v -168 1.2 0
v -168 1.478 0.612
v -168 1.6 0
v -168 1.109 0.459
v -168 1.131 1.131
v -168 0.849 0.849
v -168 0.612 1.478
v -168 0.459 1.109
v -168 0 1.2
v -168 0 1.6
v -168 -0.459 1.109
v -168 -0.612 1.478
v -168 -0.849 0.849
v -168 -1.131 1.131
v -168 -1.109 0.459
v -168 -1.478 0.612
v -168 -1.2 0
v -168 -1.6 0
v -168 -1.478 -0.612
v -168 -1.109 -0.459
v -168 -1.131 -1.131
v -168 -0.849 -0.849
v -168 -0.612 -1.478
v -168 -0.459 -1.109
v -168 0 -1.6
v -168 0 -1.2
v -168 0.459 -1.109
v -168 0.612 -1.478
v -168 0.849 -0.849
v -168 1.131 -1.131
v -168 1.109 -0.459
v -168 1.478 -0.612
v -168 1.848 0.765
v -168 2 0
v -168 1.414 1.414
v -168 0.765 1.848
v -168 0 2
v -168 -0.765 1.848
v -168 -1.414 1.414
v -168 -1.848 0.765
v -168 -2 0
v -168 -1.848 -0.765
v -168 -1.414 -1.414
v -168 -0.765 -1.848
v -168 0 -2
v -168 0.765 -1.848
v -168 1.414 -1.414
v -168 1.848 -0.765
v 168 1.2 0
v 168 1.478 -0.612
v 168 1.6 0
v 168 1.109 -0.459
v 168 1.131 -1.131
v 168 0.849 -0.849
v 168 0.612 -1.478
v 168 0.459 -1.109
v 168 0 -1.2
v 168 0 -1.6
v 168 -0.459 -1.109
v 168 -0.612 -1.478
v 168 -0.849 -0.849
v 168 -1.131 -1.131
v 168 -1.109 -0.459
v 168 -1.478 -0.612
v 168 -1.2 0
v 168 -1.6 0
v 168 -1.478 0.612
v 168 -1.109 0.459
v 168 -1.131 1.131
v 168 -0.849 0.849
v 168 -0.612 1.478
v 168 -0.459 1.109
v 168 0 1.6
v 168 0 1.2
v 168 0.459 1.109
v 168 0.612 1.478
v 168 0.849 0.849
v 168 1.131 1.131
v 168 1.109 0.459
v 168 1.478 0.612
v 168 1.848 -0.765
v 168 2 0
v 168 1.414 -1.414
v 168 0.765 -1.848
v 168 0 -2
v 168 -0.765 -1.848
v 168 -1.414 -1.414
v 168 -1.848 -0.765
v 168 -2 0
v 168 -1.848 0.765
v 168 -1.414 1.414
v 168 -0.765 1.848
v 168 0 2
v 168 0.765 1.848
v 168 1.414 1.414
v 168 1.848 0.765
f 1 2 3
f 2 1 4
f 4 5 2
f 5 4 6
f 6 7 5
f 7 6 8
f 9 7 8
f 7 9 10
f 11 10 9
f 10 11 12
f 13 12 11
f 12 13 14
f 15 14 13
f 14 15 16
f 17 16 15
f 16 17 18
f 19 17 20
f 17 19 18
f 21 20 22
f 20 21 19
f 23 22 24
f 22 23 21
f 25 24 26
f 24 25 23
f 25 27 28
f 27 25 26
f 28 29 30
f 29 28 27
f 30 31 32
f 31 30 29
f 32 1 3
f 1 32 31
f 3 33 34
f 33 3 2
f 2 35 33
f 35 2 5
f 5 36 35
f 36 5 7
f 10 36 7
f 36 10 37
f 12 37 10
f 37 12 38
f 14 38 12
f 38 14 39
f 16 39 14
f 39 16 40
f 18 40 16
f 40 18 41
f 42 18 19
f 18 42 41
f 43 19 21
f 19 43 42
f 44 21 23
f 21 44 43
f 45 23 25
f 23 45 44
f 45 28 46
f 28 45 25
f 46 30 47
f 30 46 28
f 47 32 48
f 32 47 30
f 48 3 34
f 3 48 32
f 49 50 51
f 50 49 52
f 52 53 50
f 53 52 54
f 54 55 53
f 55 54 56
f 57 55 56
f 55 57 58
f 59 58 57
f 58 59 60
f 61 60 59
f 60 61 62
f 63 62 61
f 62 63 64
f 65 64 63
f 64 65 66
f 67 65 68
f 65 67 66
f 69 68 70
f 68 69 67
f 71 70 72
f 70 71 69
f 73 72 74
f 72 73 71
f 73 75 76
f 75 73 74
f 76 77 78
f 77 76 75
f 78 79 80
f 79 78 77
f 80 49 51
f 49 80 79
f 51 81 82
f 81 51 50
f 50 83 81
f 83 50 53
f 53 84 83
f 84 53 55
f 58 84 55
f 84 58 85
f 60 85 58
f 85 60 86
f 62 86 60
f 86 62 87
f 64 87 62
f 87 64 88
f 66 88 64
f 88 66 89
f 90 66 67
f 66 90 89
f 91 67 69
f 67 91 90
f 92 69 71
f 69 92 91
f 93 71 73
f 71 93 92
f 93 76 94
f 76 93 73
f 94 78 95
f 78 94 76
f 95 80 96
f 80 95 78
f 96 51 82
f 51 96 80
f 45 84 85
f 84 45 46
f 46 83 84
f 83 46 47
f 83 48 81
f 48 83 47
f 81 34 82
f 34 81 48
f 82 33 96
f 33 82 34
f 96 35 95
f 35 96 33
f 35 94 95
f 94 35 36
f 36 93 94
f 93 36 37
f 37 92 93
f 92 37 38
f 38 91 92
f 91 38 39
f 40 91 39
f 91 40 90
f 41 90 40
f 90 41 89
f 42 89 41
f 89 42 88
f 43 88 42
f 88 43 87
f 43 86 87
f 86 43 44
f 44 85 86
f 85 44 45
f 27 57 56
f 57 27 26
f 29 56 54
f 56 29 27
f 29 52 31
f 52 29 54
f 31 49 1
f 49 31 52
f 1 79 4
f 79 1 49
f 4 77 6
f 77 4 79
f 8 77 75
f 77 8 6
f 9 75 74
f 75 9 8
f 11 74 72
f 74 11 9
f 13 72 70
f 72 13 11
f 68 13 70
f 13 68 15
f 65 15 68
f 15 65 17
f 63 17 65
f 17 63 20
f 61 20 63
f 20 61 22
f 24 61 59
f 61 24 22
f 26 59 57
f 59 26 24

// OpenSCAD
// file: ../p/4-4cyli.scad
use <../lib.scad>
function ldraw_lib__4_4cyli() = [
// 0 Cylinder 1.0
// 0 Name: 4-4cyli.dat
// 0 Author: James Jessiman
// 0 !LDRAW_ORG Primitive UPDATE 2005-01
// 0 !LICENSE Licensed under CC BY 2.0 and CC BY 4.0 : see CAreadme.txt
// 
// 0 BFC CERTIFY CCW
  [0,"BFC","CERTIFY"],
  [0,"BFC","CCW"],
// 
// 0 !HISTORY 1998-12-15 [PTadmin] Official Update 1998-10
// 0 !HISTORY 2002-03-23 [sbliss] Added BFC statement; merged headers from files in distributions LDraw 0.27 and Complete.
// 0 !HISTORY 2002-04-25 [PTadmin] Official Update 2002-02
// 0 !HISTORY 2004-12-14 [guyvivan] BFC CCW
// 0 !HISTORY 2005-12-28 [PTadmin] Official Update 2005-01
// 0 !HISTORY 2007-06-24 [PTadmin] Header formatted for Contributor Agreement
// 0 !HISTORY 2008-07-01 [PTadmin] Official Update 2008-01
// 
// 
// 4 16 1 1 0 0.9239 1 0.3827 0.9239 0 0.3827 1 0 0
  [4,16,1,1,0,0.9239,1,0.3827,0.9239,0,0.3827,1,0,0],
// 5 24 1 0 0 1 1 0 0.9239 0 0.3827 0.9239 0 -0.3827
  [5,24,1,0,0,1,1,0,0.9239,0,0.3827,0.9239,0,-0.3827],
// 4 16 0.9239 1 0.3827 0.7071 1 0.7071 0.7071 0 0.7071 0.9239 0 0.3827
  [4,16,0.9239,1,0.3827,0.7071,1,0.7071,0.7071,0,0.7071,0.9239,0,0.3827],
// 5 24 0.9239 0 0.3827 0.9239 1 0.3827 0.7071 0 0.7071 1 0 0
  [5,24,0.9239,0,0.3827,0.9239,1,0.3827,0.7071,0,0.7071,1,0,0],
// 4 16 0.7071 1 0.7071 0.3827 1 0.9239 0.3827 0 0.9239 0.7071 0 0.7071
  [4,16,0.7071,1,0.7071,0.3827,1,0.9239,0.3827,0,0.9239,0.7071,0,0.7071],
// 5 24 0.7071 0 0.7071 0.7071 1 0.7071 0.3827 0 0.9239 0.9239 0 0.3827
  [5,24,0.7071,0,0.7071,0.7071,1,0.7071,0.3827,0,0.9239,0.9239,0,0.3827],
// 4 16 0.3827 1 0.9239 0 1 1 0 0 1 0.3827 0 0.9239
  [4,16,0.3827,1,0.9239,0,1,1,0,0,1,0.3827,0,0.9239],
// 5 24 0.3827 0 0.9239 0.3827 1 0.9239 0 0 1 0.7071 0 0.7071
  [5,24,0.3827,0,0.9239,0.3827,1,0.9239,0,0,1,0.7071,0,0.7071],
// 4 16 0 1 1 -0.3827 1 0.9239 -0.3827 0 0.9239 0 0 1
  [4,16,0,1,1,-0.3827,1,0.9239,-0.3827,0,0.9239,0,0,1],
// 5 24 0 0 1 0 1 1 -0.3827 0 0.9239 0.3827 0 0.9239
  [5,24,0,0,1,0,1,1,-0.3827,0,0.9239,0.3827,0,0.9239],
// 4 16 -0.3827 1 0.9239 -0.7071 1 0.7071 -0.7071 0 0.7071 -0.3827 0 0.9239
  [4,16,-0.3827,1,0.9239,-0.7071,1,0.7071,-0.7071,0,0.7071,-0.3827,0,0.9239],
// 5 24 -0.3827 0 0.9239 -0.3827 1 0.9239 -0.7071 0 0.7071 0 0 1
  [5,24,-0.3827,0,0.9239,-0.3827,1,0.9239,-0.7071,0,0.7071,0,0,1],
// 4 16 -0.7071 1 0.7071 -0.9239 1 0.3827 -0.9239 0 0.3827 -0.7071 0 0.7071
  [4,16,-0.7071,1,0.7071,-0.9239,1,0.3827,-0.9239,0,0.3827,-0.7071,0,0.7071],
// 5 24 -0.7071 0 0.7071 -0.7071 1 0.7071 -0.9239 0 0.3827 -0.3827 0 0.9239
  [5,24,-0.7071,0,0.7071,-0.7071,1,0.7071,-0.9239,0,0.3827,-0.3827,0,0.9239],
// 4 16 -0.9239 1 0.3827 -1 1 0 -1 0 0 -0.9239 0 0.3827
  [4,16,-0.9239,1,0.3827,-1,1,0,-1,0,0,-0.9239,0,0.3827],
// 5 24 -0.9239 0 0.3827 -0.9239 1 0.3827 -1 0 0 -0.7071 0 0.7071
  [5,24,-0.9239,0,0.3827,-0.9239,1,0.3827,-1,0,0,-0.7071,0,0.7071],
// 4 16 -1 1 0 -0.9239 1 -0.3827 -0.9239 0 -0.3827 -1 0 0
  [4,16,-1,1,0,-0.9239,1,-0.3827,-0.9239,0,-0.3827,-1,0,0],
// 5 24 -1 0 0 -1 1 0 -0.9239 0 -0.3827 -0.9239 0 0.3827
  [5,24,-1,0,0,-1,1,0,-0.9239,0,-0.3827,-0.9239,0,0.3827],
// 4 16 -0.9239 1 -0.3827 -0.7071 1 -0.7071 -0.7071 0 -0.7071 -0.9239 0 -0.3827
  [4,16,-0.9239,1,-0.3827,-0.7071,1,-0.7071,-0.7071,0,-0.7071,-0.9239,0,-0.3827],
// 5 24 -0.9239 0 -0.3827 -0.9239 1 -0.3827 -0.7071 0 -0.7071 -1 0 0
  [5,24,-0.9239,0,-0.3827,-0.9239,1,-0.3827,-0.7071,0,-0.7071,-1,0,0],
// 4 16 -0.7071 1 -0.7071 -0.3827 1 -0.9239 -0.3827 0 -0.9239 -0.7071 0 -0.7071
  [4,16,-0.7071,1,-0.7071,-0.3827,1,-0.9239,-0.3827,0,-0.9239,-0.7071,0,-0.7071],
// 5 24 -0.7071 0 -0.7071 -0.7071 1 -0.7071 -0.3827 0 -0.9239 -0.9239 0 -0.3827
  [5,24,-0.7071,0,-0.7071,-0.7071,1,-0.7071,-0.3827,0,-0.9239,-0.9239,0,-0.3827],
// 4 16 -0.3827 1 -0.9239 0 1 -1 0 0 -1 -0.3827 0 -0.9239
  [4,16,-0.3827,1,-0.9239,0,1,-1,0,0,-1,-0.3827,0,-0.9239],
// 5 24 -0.3827 0 -0.9239 -0.3827 1 -0.9239 0 0 -1 -0.7071 0 -0.7071
  [5,24,-0.3827,0,-0.9239,-0.3827,1,-0.9239,0,0,-1,-0.7071,0,-0.7071],
// 4 16 0 1 -1 0.3827 1 -0.9239 0.3827 0 -0.9239 0 0 -1
  [4,16,0,1,-1,0.3827,1,-0.9239,0.3827,0,-0.9239,0,0,-1],
// 5 24 0 0 -1 0 1 -1 0.3827 0 -0.9239 -0.3827 0 -0.9239
  [5,24,0,0,-1,0,1,-1,0.3827,0,-0.9239,-0.3827,0,-0.9239],
// 4 16 0.3827 1 -0.9239 0.7071 1 -0.7071 0.7071 0 -0.7071 0.3827 0 -0.9239
  [4,16,0.3827,1,-0.9239,0.7071,1,-0.7071,0.7071,0,-0.7071,0.3827,0,-0.9239],
// 5 24 0.3827 0 -0.9239 0.3827 1 -0.9239 0.7071 0 -0.7071 0 0 -1
  [5,24,0.3827,0,-0.9239,0.3827,1,-0.9239,0.7071,0,-0.7071,0,0,-1],
// 4 16 0.7071 1 -0.7071 0.9239 1 -0.3827 0.9239 0 -0.3827 0.7071 0 -0.7071
  [4,16,0.7071,1,-0.7071,0.9239,1,-0.3827,0.9239,0,-0.3827,0.7071,0,-0.7071],
// 5 24 0.7071 0 -0.7071 0.7071 1 -0.7071 0.9239 0 -0.3827 0.3827 0 -0.9239
  [5,24,0.7071,0,-0.7071,0.7071,1,-0.7071,0.9239,0,-0.3827,0.3827,0,-0.9239],
// 4 16 0.9239 1 -0.3827 1 1 0 1 0 0 0.9239 0 -0.3827
  [4,16,0.9239,1,-0.3827,1,1,0,1,0,0,0.9239,0,-0.3827],
// 5 24 0.9239 0 -0.3827 0.9239 1 -0.3827 1 0 0 0.7071 0 -0.7071
  [5,24,0.9239,0,-0.3827,0.9239,1,-0.3827,1,0,0,0.7071,0,-0.7071],
// 0
];
module ldraw_lib__4_4cyli(step=0, col=false, unit=2/5, alt=false, line=0.2, solid=!$preview)
    makepoly(ldraw_lib__4_4cyli(), step=step, col=col, unit=unit, alt=alt, line=line, solid=solid);
ldraw_lib__4_4cyli(line=0.2);
// file: ../p/4-4ring4.scad
use <../lib.scad>
function ldraw_lib__4_4ring4() = [
// 0 Ring  4 x 1.0
// 0 Name: 4-4ring4.dat
// 0 Author: James Jessiman
// 0 !LDRAW_ORG Primitive UPDATE 2009-01
// 0 !LICENSE Licensed under CC BY 2.0 and CC BY 4.0 : see CAreadme.txt
// 
// 0 BFC CERTIFY CCW
  [0,"BFC","CERTIFY"],
  [0,"BFC","CCW"],
// 
// 0 !HISTORY 1998-12-15 [PTadmin] Official Update 1998-10
// 0 !HISTORY 2002-04-08 [BrickCaster] Modified for BFC compliance
// 0 !HISTORY 2002-04-25 [PTadmin] Official Update 2002-02
// 0 !HISTORY 2007-06-24 [PTadmin] Header formatted for Contributor Agreement
// 0 !HISTORY 2008-07-01 [PTadmin] Official Update 2008-01
// 0 !HISTORY 2008-08-26 [cwdee] Switch polygon winding and rename
// 0 !HISTORY 2009-05-02 [PTadmin] Official Update 2009-01
// 
// 
// 4 16 -1.9135 0 4.6195 -1.5308 0 3.6956 0 0 4 0 0 5
  [4,16,-1.9135,0,4.6195,-1.5308,0,3.6956,0,0,4,0,0,5],
// 4 16 -3.5355 0 3.5355 -2.8284 0 2.8284 -1.5308 0 3.6956 -1.9135 0 4.6195
  [4,16,-3.5355,0,3.5355,-2.8284,0,2.8284,-1.5308,0,3.6956,-1.9135,0,4.6195],
// 4 16 -4.6195 0 1.9135 -3.6956 0 1.5308 -2.8284 0 2.8284 -3.5355 0 3.5355
  [4,16,-4.6195,0,1.9135,-3.6956,0,1.5308,-2.8284,0,2.8284,-3.5355,0,3.5355],
// 4 16 -5 0 0 -4 0 0 -3.6956 0 1.5308 -4.6195 0 1.9135
  [4,16,-5,0,0,-4,0,0,-3.6956,0,1.5308,-4.6195,0,1.9135],
// 4 16 -4.6195 0 -1.9135 -3.6956 0 -1.5308 -4 0 0 -5 0 0
  [4,16,-4.6195,0,-1.9135,-3.6956,0,-1.5308,-4,0,0,-5,0,0],
// 4 16 -3.5355 0 -3.5355 -2.8284 0 -2.8284 -3.6956 0 -1.5308 -4.6195 0 -1.9135
  [4,16,-3.5355,0,-3.5355,-2.8284,0,-2.8284,-3.6956,0,-1.5308,-4.6195,0,-1.9135],
// 4 16 -1.9135 0 -4.6195 -1.5308 0 -3.6956 -2.8284 0 -2.8284 -3.5355 0 -3.5355
  [4,16,-1.9135,0,-4.6195,-1.5308,0,-3.6956,-2.8284,0,-2.8284,-3.5355,0,-3.5355],
// 4 16 0 0 -5 0 0 -4 -1.5308 0 -3.6956 -1.9135 0 -4.6195
  [4,16,0,0,-5,0,0,-4,-1.5308,0,-3.6956,-1.9135,0,-4.6195],
// 4 16 1.9135 0 -4.6195 1.5308 0 -3.6956 0 0 -4 0 0 -5
  [4,16,1.9135,0,-4.6195,1.5308,0,-3.6956,0,0,-4,0,0,-5],
// 4 16 3.5355 0 -3.5355 2.8284 0 -2.8284 1.5308 0 -3.6956 1.9135 0 -4.6195
  [4,16,3.5355,0,-3.5355,2.8284,0,-2.8284,1.5308,0,-3.6956,1.9135,0,-4.6195],
// 4 16 4.6195 0 -1.9135 3.6956 0 -1.5308 2.8284 0 -2.8284 3.5355 0 -3.5355
  [4,16,4.6195,0,-1.9135,3.6956,0,-1.5308,2.8284,0,-2.8284,3.5355,0,-3.5355],
// 4 16 5 0 0 4 0 0 3.6956 0 -1.5308 4.6195 0 -1.9135
  [4,16,5,0,0,4,0,0,3.6956,0,-1.5308,4.6195,0,-1.9135],
// 4 16 4.6195 0 1.9135 3.6956 0 1.5308 4 0 0 5 0 0
  [4,16,4.6195,0,1.9135,3.6956,0,1.5308,4,0,0,5,0,0],
// 4 16 3.5355 0 3.5355 2.8284 0 2.8284 3.6956 0 1.5308 4.6195 0 1.9135
  [4,16,3.5355,0,3.5355,2.8284,0,2.8284,3.6956,0,1.5308,4.6195,0,1.9135],
// 4 16 1.9135 0 4.6195 1.5308 0 3.6956 2.8284 0 2.8284 3.5355 0 3.5355
  [4,16,1.9135,0,4.6195,1.5308,0,3.6956,2.8284,0,2.8284,3.5355,0,3.5355],
// 4 16 0 0 5 0 0 4 1.5308 0 3.6956 1.9135 0 4.6195
  [4,16,0,0,5,0,0,4,1.5308,0,3.6956,1.9135,0,4.6195],
// 0
];
module ldraw_lib__4_4ring4(step=0, col=false, unit=2/5, alt=false, line=0.2, solid=!$preview)
    makepoly(ldraw_lib__4_4ring4(), step=step, col=col, unit=unit, alt=alt, line=line, solid=solid);
ldraw_lib__4_4ring4(line=0.2);
// file: ../p/4-4ring3.scad
use <../lib.scad>
function ldraw_lib__4_4ring3() = [
// 0 Ring  3 x 1.0
// 0 Name: 4-4ring3.dat
// 0 Author: James Jessiman
// 0 !LDRAW_ORG Primitive UPDATE 2009-01
// 0 !LICENSE Licensed under CC BY 2.0 and CC BY 4.0 : see CAreadme.txt
// 
// 0 BFC CERTIFY CCW
  [0,"BFC","CERTIFY"],
  [0,"BFC","CCW"],
// 
// 0 !HISTORY 1998-12-15 [PTadmin] Official Update 1998-10
// 0 !HISTORY 2002-04-05 [hafhead] Added BFC statement
// 0 !HISTORY 2002-04-25 [PTadmin] Official Update 2002-02
// 0 !HISTORY 2007-06-24 [PTadmin] Header formatted for Contributor Agreement
// 0 !HISTORY 2008-07-01 [PTadmin] Official Update 2008-01
// 0 !HISTORY 2008-08-26 [cwdee] Switch polygon winding and rename
// 0 !HISTORY 2009-05-02 [PTadmin] Official Update 2009-01
// 
// 
// 4 16 -1.5308 0 3.6956 -1.1481 0 2.7717 0 0 3 0 0 4
  [4,16,-1.5308,0,3.6956,-1.1481,0,2.7717,0,0,3,0,0,4],
// 4 16 -2.8284 0 2.8284 -2.1213 0 2.1213 -1.1481 0 2.7717 -1.5308 0 3.6956
  [4,16,-2.8284,0,2.8284,-2.1213,0,2.1213,-1.1481,0,2.7717,-1.5308,0,3.6956],
// 4 16 -3.6956 0 1.5308 -2.7717 0 1.1481 -2.1213 0 2.1213 -2.8284 0 2.8284
  [4,16,-3.6956,0,1.5308,-2.7717,0,1.1481,-2.1213,0,2.1213,-2.8284,0,2.8284],
// 4 16 -4 0 0 -3 0 0 -2.7717 0 1.1481 -3.6956 0 1.5308
  [4,16,-4,0,0,-3,0,0,-2.7717,0,1.1481,-3.6956,0,1.5308],
// 4 16 -3.6956 0 -1.5308 -2.7717 0 -1.1481 -3 0 0 -4 0 0
  [4,16,-3.6956,0,-1.5308,-2.7717,0,-1.1481,-3,0,0,-4,0,0],
// 4 16 -2.8284 0 -2.8284 -2.1213 0 -2.1213 -2.7717 0 -1.1481 -3.6956 0 -1.5308
  [4,16,-2.8284,0,-2.8284,-2.1213,0,-2.1213,-2.7717,0,-1.1481,-3.6956,0,-1.5308],
// 4 16 -1.5308 0 -3.6956 -1.1481 0 -2.7717 -2.1213 0 -2.1213 -2.8284 0 -2.8284
  [4,16,-1.5308,0,-3.6956,-1.1481,0,-2.7717,-2.1213,0,-2.1213,-2.8284,0,-2.8284],
// 4 16 0 0 -4 0 0 -3 -1.1481 0 -2.7717 -1.5308 0 -3.6956
  [4,16,0,0,-4,0,0,-3,-1.1481,0,-2.7717,-1.5308,0,-3.6956],
// 4 16 1.5308 0 -3.6956 1.1481 0 -2.7717 0 0 -3 0 0 -4
  [4,16,1.5308,0,-3.6956,1.1481,0,-2.7717,0,0,-3,0,0,-4],
// 4 16 2.8284 0 -2.8284 2.1213 0 -2.1213 1.1481 0 -2.7717 1.5308 0 -3.6956
  [4,16,2.8284,0,-2.8284,2.1213,0,-2.1213,1.1481,0,-2.7717,1.5308,0,-3.6956],
// 4 16 3.6956 0 -1.5308 2.7717 0 -1.1481 2.1213 0 -2.1213 2.8284 0 -2.8284
  [4,16,3.6956,0,-1.5308,2.7717,0,-1.1481,2.1213,0,-2.1213,2.8284,0,-2.8284],
// 4 16 4 0 0 3 0 0 2.7717 0 -1.1481 3.6956 0 -1.5308
  [4,16,4,0,0,3,0,0,2.7717,0,-1.1481,3.6956,0,-1.5308],
// 4 16 3.6956 0 1.5308 2.7717 0 1.1481 3 0 0 4 0 0
  [4,16,3.6956,0,1.5308,2.7717,0,1.1481,3,0,0,4,0,0],
// 4 16 2.8284 0 2.8284 2.1213 0 2.1213 2.7717 0 1.1481 3.6956 0 1.5308
  [4,16,2.8284,0,2.8284,2.1213,0,2.1213,2.7717,0,1.1481,3.6956,0,1.5308],
// 4 16 1.5308 0 3.6956 1.1481 0 2.7717 2.1213 0 2.1213 2.8284 0 2.8284
  [4,16,1.5308,0,3.6956,1.1481,0,2.7717,2.1213,0,2.1213,2.8284,0,2.8284],
// 4 16 0 0 4 0 0 3 1.1481 0 2.7717 1.5308 0 3.6956
  [4,16,0,0,4,0,0,3,1.1481,0,2.7717,1.5308,0,3.6956],
// 0
];
module ldraw_lib__4_4ring3(step=0, col=false, unit=2/5, alt=false, line=0.2, solid=!$preview)
    makepoly(ldraw_lib__4_4ring3(), step=step, col=col, unit=unit, alt=alt, line=line, solid=solid);
ldraw_lib__4_4ring3(line=0.2);
// file: ../p/4-4edge.scad
use <../lib.scad>
function ldraw_lib__4_4edge() = [
// 0 Circle 1.0
// 0 Name: 4-4edge.dat
// 0 Author: James Jessiman
// 0 !LDRAW_ORG Primitive UPDATE 2017-01
// 0 !LICENSE Licensed under CC BY 2.0 and CC BY 4.0 : see CAreadme.txt
// 
// 0 BFC CERTIFY CCW
  [0,"BFC","CERTIFY"],
  [0,"BFC","CCW"],
// 
// 0 !HISTORY 1998-12-15 [PTadmin] Official Update 1998-10
// 0 !HISTORY 2005-12-28 [PTadmin] Official Update 2005-01
// 0 !HISTORY 2007-06-24 [PTadmin] Header formatted for Contributor Agreement
// 0 !HISTORY 2008-07-01 [PTadmin] Official Update 2008-01
// 0 !HISTORY 2017-01-15 [Steffen] BFCed
// 0 !HISTORY 2017-12-30 [PTadmin] Official Update 2017-01
// 
// 
// 2 24 1 0 0 0.9239 0 0.3827
  [2,24,1,0,0,0.9239,0,0.3827],
// 2 24 0.9239 0 0.3827 0.7071 0 0.7071
  [2,24,0.9239,0,0.3827,0.7071,0,0.7071],
// 2 24 0.7071 0 0.7071 0.3827 0 0.9239
  [2,24,0.7071,0,0.7071,0.3827,0,0.9239],
// 2 24 0.3827 0 0.9239 0 0 1
  [2,24,0.3827,0,0.9239,0,0,1],
// 2 24 0 0 1 -0.3827 0 0.9239
  [2,24,0,0,1,-0.3827,0,0.9239],
// 2 24 -0.3827 0 0.9239 -0.7071 0 0.7071
  [2,24,-0.3827,0,0.9239,-0.7071,0,0.7071],
// 2 24 -0.7071 0 0.7071 -0.9239 0 0.3827
  [2,24,-0.7071,0,0.7071,-0.9239,0,0.3827],
// 2 24 -0.9239 0 0.3827 -1 0 -0
  [2,24,-0.9239,0,0.3827,-1,0,-0],
// 2 24 -1 0 -0 -0.9239 0 -0.3827
  [2,24,-1,0,-0,-0.9239,0,-0.3827],
// 2 24 -0.9239 0 -0.3827 -0.7071 0 -0.7071
  [2,24,-0.9239,0,-0.3827,-0.7071,0,-0.7071],
// 2 24 -0.7071 0 -0.7071 -0.3827 0 -0.9239
  [2,24,-0.7071,0,-0.7071,-0.3827,0,-0.9239],
// 2 24 -0.3827 0 -0.9239 0 0 -1
  [2,24,-0.3827,0,-0.9239,0,0,-1],
// 2 24 0 0 -1 0.3827 0 -0.9239
  [2,24,0,0,-1,0.3827,0,-0.9239],
// 2 24 0.3827 0 -0.9239 0.7071 0 -0.7071
  [2,24,0.3827,0,-0.9239,0.7071,0,-0.7071],
// 2 24 0.7071 0 -0.7071 0.9239 0 -0.3827
  [2,24,0.7071,0,-0.7071,0.9239,0,-0.3827],
// 2 24 0.9239 0 -0.3827 1 0 0
  [2,24,0.9239,0,-0.3827,1,0,0],
];
module ldraw_lib__4_4edge(step=0, col=false, unit=2/5, alt=false, line=0.2, solid=!$preview)
    makepoly(ldraw_lib__4_4edge(), step=step, col=col, unit=unit, alt=alt, line=line, solid=solid);
ldraw_lib__4_4edge(line=0.2);
// file: 71533k03.scad
use <../lib.scad>
use <../p/4-4cyli.scad>
function ldraw_lib__71533k03() = [
// 0 ~Technic Pneumatic Tube Segment
// 0 Name: 71533k03.dat
// 0 Author: Jaco van der Molen [Jaco]
// 0 !LDRAW_ORG Part Flexible_Section UPDATE 2020-01
// 0 !LICENSE Licensed under CC BY 2.0 and CC BY 4.0 : see CAreadme.txt
// 
// 0 BFC CERTIFY CW
  [0,"BFC","CERTIFY"],
  [0,"BFC","CW"],
// 
// 0 !HISTORY 2003-11-30 [Steffen] BFCed
// 0 !HISTORY 2009-12-29 [PTadmin] Official Update 2009-03
// 0 !HISTORY 2020-06-27 [PTadmin] Renamed from 166
// 0 !HISTORY 2020-06-28 [PTadmin] Official Update 2020-01
// 
// 
// 1 16 0 0 0 5 0 0 0 1 0 0 0 5 4-4cyli.dat
  [1,16,0,0,0,5,0,0,0,1,0,0,0,5, ldraw_lib__4_4cyli()],
// 0 BFC INVERTNEXT
  [0,"BFC","INVERTNEXT"],
// 1 16 0 0 0 3 0 0 0 1 0 0 0 3 4-4cyli.dat
  [1,16,0,0,0,3,0,0,0,1,0,0,0,3, ldraw_lib__4_4cyli()],
// 0
];
module ldraw_lib__71533k03(step=0, col=false, unit=2/5, alt=false, line=0.2, solid=!$preview)
    makepoly(ldraw_lib__71533k03(), step=step, col=col, unit=unit, alt=alt, line=line, solid=solid);
ldraw_lib__71533k03(line=0.2);
// file: 71533k02.scad
use <../lib.scad>
use <../p/4-4edge.scad>
use <../p/4-4ring3.scad>
use <../p/4-4ring4.scad>
function ldraw_lib__71533k02() = [
// 0 ~Technic Pneumatic Tube End (Non-Bulged)
// 0 Name: 71533k02.dat
// 0 Author: Steffen [Steffen]
// 0 !LDRAW_ORG Part Flexible_Section UPDATE 2020-01
// 0 !LICENSE Licensed under CC BY 2.0 and CC BY 4.0 : see CAreadme.txt
// 
// 0 BFC CERTIFY CCW
  [0,"BFC","CERTIFY"],
  [0,"BFC","CCW"],
// 
// 0 !HISTORY 2020-06-28 [PTadmin] Official Update 2020-01
// 
// 
// 0 // This file goes together with 71533k01.dat and 71533k03.dat.
// 0 // Those 3 files can be used to create Technic Pneumatic Tubes
// 0 // with either bulged or non-bulged ends.
// 
// 1 16 0 0 0 1 0 0 0 1 0 0 0 1 4-4ring3.dat
  [1,16,0,0,0,1,0,0,0,1,0,0,0,1, ldraw_lib__4_4ring3()],
// 1 16 0 0 0 1 0 0 0 1 0 0 0 1 4-4ring4.dat
  [1,16,0,0,0,1,0,0,0,1,0,0,0,1, ldraw_lib__4_4ring4()],
// 1 16 0 0 0 3 0 0 0 3 0 0 0 3 4-4edge.dat
  [1,16,0,0,0,3,0,0,0,3,0,0,0,3, ldraw_lib__4_4edge()],
// 1 16 0 0 0 5 0 0 0 5 0 0 0 5 4-4edge.dat
  [1,16,0,0,0,5,0,0,0,5,0,0,0,5, ldraw_lib__4_4edge()],
];
module ldraw_lib__71533k02(step=0, col=false, unit=2/5, alt=false, line=0.2, solid=!$preview)
    makepoly(ldraw_lib__71533k02(), step=step, col=col, unit=unit, alt=alt, line=line, solid=solid);
ldraw_lib__71533k02(line=0.2);
// main file
use <../lib.scad>
use <71533k02.scad>
use <71533k03.scad>
function ldraw_lib__44079_f1() = [
// 0 Technic Pneumatic Tube 42L
// 0 Name: 44079-f1.dat
// 0 Author: Philippe Hurbain [Philo]
// 0 !LDRAW_ORG Part UPDATE 2020-02
// 0 !LICENSE Licensed under CC BY 2.0 and CC BY 4.0 : see CAreadme.txt
// 
// 0 BFC CERTIFY CCW
  [0,"BFC","CERTIFY"],
  [0,"BFC","CCW"],
// 
// 0 !KEYWORDS 336 mm
// 
// 0 !HISTORY 2020-09-05 [PTadmin] Official Update 2020-02
// 
// 
// 1 16 -420 0 0 0 1 0 1 0 0 0 0 1 71533k02.dat
  [1,16,-420,0,0,0,1,0,1,0,0,0,0,1, ldraw_lib__71533k02()],
// 1 16 420 0 0 0 -1 0 -1 0 0 0 0 1 71533k02.dat
  [1,16,420,0,0,0,-1,0,-1,0,0,0,0,1, ldraw_lib__71533k02()],
// 1 16 -420 0 0 0 840 0 1 0 0 0 0 1 71533k03.dat
  [1,16,-420,0,0,0,840,0,1,0,0,0,0,1, ldraw_lib__71533k03()],
];
module ldraw_lib__44079_f1(step=0, col=false, unit=2/5, alt=false, line=0.2, solid=!$preview)
    makepoly(ldraw_lib__44079_f1(), step=step, col=col, unit=unit, alt=alt, line=line, solid=solid);
ldraw_lib__44079_f1(line=0.2);
